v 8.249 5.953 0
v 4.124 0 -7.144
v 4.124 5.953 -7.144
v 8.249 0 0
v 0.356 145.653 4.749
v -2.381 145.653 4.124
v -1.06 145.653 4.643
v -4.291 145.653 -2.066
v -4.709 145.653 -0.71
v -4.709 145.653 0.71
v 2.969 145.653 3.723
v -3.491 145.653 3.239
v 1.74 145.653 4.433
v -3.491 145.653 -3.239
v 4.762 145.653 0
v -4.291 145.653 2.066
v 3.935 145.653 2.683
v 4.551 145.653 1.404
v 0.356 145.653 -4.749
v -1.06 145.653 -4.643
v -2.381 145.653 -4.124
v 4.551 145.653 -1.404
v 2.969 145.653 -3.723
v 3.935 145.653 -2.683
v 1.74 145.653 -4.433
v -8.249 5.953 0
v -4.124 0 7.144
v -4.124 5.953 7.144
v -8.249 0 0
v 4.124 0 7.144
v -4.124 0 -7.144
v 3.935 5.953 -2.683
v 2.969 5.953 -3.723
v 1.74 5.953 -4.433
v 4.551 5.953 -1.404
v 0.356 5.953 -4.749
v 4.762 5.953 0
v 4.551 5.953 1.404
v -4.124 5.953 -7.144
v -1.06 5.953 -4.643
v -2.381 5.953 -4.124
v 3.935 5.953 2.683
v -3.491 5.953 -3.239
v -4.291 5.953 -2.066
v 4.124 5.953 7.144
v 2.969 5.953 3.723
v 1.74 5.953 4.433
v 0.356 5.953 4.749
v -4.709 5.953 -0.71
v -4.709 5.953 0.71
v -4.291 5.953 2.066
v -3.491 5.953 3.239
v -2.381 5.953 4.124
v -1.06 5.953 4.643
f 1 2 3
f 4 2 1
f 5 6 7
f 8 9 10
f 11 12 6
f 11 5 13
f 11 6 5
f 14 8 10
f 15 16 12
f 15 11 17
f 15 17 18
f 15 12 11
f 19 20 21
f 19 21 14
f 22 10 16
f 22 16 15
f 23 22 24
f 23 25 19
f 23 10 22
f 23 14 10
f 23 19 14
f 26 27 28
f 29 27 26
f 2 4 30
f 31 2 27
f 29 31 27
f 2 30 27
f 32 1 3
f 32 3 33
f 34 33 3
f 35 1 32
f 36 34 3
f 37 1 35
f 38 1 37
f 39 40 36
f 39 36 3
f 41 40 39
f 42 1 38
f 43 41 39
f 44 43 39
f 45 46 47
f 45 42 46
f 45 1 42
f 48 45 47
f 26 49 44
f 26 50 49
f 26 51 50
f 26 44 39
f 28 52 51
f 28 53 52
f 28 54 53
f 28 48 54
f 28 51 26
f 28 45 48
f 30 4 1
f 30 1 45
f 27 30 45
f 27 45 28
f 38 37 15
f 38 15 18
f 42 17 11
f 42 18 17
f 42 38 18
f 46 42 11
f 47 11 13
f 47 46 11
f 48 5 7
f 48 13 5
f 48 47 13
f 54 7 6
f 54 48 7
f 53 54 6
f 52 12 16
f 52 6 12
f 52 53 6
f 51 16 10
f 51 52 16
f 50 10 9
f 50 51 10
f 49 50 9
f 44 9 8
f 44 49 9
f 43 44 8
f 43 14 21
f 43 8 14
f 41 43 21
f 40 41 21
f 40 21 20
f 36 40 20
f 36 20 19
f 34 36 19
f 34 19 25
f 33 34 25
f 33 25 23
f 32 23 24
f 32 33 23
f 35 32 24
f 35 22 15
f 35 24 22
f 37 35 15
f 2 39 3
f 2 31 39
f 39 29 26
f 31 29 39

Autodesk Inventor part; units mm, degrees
ref_plane "YZ Plane" through (0, 0, 0) normal (1, 0, 0) x (0, 1, 0)
ref_plane "XZ Plane" through (0, 0, 0) normal (0, 1, 0) x (-1, 0, 0)
ref_plane "XY Plane" through (0, 0, 0) normal (0, 0, 1) x (1, 0, 0)
sketch "Sketch1" plane through (0, 0, 0) normal (0, 1, 0) x (-1, 0, 0)
  line L0 (-4.1244, -7.1437) -> (-8.2489, 0)
  line L1 (-8.2489, 0) -> (-4.1244, 7.1438)
  line L2 (-4.1244, 7.1438) -> (4.1244, 7.1438)
  line L3 (4.1244, 7.1438) -> (8.2489, 0)
  line L4 (8.2489, 0) -> (4.1244, -7.1437)
  line L5 (4.1244, -7.1437) -> (-4.1244, -7.1437)
  point P0 (0, 0)
  point P1 (0, 0)
  dimension "d0" = 14.2875
extrude "Extrusion1" add sketch "Sketch1" along normal blind 5.9531
sketch "Sketch2" plane through (0, 5.9531, 0) normal (0, 1, 0) x (1, 0, 0)
  circle A0 centre (0, 0) radius 4.7625
  dimension "d3" = 9.525
extrude "Extrusion2" add sketch "Sketch2" along normal blind 139.7
properties part number "half-inch hex bolt" material "Steel, Cast"
